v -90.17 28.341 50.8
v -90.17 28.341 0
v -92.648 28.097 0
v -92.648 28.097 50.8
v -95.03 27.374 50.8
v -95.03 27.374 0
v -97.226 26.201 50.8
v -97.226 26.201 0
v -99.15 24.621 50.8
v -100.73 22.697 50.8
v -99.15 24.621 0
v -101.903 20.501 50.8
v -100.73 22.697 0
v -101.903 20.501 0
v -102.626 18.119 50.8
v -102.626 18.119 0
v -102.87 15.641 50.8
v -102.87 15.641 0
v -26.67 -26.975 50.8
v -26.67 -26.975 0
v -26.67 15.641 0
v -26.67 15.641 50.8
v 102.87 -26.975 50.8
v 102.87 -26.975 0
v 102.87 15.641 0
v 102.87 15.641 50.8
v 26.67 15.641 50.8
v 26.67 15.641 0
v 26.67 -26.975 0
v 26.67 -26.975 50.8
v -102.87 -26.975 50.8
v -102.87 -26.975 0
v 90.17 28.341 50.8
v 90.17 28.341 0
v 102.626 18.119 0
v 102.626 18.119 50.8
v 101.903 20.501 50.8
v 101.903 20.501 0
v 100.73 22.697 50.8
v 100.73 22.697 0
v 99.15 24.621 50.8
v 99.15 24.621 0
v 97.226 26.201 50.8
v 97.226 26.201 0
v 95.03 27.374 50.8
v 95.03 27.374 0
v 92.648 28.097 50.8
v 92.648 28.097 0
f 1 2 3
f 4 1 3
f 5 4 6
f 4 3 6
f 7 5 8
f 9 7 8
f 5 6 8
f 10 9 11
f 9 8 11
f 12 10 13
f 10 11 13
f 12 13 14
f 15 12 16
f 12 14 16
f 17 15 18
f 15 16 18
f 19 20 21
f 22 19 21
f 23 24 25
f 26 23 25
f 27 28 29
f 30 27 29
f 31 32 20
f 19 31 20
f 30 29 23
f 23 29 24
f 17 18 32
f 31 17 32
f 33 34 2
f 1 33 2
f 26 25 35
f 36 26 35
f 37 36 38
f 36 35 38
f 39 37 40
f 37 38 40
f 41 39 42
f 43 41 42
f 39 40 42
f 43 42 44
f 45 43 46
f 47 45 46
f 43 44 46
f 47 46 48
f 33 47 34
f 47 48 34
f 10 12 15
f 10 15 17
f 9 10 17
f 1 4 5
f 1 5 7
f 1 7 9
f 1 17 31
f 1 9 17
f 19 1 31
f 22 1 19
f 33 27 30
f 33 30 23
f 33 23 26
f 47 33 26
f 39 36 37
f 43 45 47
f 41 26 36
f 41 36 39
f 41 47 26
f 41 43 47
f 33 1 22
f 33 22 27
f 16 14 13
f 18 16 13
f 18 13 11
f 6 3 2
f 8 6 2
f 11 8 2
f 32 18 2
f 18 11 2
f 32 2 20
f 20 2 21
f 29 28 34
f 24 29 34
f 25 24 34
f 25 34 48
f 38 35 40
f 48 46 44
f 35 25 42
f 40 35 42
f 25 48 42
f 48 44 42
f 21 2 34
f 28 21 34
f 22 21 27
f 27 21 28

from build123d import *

# Parameters (mm, degrees)
F0_W     = 63.5
F0_H     = 12.7
F0_W_2   = 76.2
F0_H_2   = 25.4
F0_W_3   = 53.3399905968
F0_W_4   = 63.5000094032
F1_DEPTH = 50.8


# Not quite as in the source:
# - ends of sketch curves that miss each other by under 0.0002 mm in the source are joined


with BuildPart() as f1:
    # F0 (on Top) → F1 (new body)
    with BuildSketch(Plane.XY):
        with Locations((-58.4199952984, 21.9910541385)):
            Rectangle(F0_W, F0_H)
        with BuildLine():
            Line((-102.8699952984, 15.6410541385), (-102.8699952984, -1.5747001893))
            Line((-102.8699952984, -1.5747001893), (-26.6699952984, -1.5747001893))
            Line((-26.6699952984, -1.5747001893), (-26.6699952984, 15.6410541385))
            Line((-26.6699952984, 15.6410541385), (-90.1699952984, 15.6410541385))
            Line((-90.1699952984, 15.6410541385), (-90.1699952984, 28.3410541385))
            ThreePointArc((-90.1699952984, 28.3410541385), (-99.1502514195, 24.6213102596), (-102.8699952984, 15.6410541385))
        make_face()
        with Locations((-64.7699952984, -14.2747001893)):
            Rectangle(F0_W_2, F0_H_2)
        with Locations((0, 21.9910541385)):
            Rectangle(F0_W_3, F0_H)
        with Locations((58.42, 21.9910541385)):
            Rectangle(F0_W_4, F0_H)
        with BuildLine():
            Line((90.1700047016, 15.6410541385), (26.6699952984, 15.6410541385))
            Line((26.6699952984, 15.6410541385), (26.6699952984, -1.5747001893))
            Line((26.6699952984, -1.5747001893), (102.8699952984, -1.5747001893))
            Line((102.8699952984, -1.5747001893), (102.8699952984, 15.6410541385))
            ThreePointArc((102.8699952984, 15.6410541385), (99.1502514195, 24.6213102596), (90.1699952984, 28.3410541385))
            Line((90.1699952984, 28.3410541385), (90.1700047016, 15.6410541385))
        make_face()
        with Locations((64.7699952984, -14.2747001893)):
            Rectangle(F0_W_2, F0_H_2)
    extrude(amount=F1_DEPTH)


solid = f1.part
